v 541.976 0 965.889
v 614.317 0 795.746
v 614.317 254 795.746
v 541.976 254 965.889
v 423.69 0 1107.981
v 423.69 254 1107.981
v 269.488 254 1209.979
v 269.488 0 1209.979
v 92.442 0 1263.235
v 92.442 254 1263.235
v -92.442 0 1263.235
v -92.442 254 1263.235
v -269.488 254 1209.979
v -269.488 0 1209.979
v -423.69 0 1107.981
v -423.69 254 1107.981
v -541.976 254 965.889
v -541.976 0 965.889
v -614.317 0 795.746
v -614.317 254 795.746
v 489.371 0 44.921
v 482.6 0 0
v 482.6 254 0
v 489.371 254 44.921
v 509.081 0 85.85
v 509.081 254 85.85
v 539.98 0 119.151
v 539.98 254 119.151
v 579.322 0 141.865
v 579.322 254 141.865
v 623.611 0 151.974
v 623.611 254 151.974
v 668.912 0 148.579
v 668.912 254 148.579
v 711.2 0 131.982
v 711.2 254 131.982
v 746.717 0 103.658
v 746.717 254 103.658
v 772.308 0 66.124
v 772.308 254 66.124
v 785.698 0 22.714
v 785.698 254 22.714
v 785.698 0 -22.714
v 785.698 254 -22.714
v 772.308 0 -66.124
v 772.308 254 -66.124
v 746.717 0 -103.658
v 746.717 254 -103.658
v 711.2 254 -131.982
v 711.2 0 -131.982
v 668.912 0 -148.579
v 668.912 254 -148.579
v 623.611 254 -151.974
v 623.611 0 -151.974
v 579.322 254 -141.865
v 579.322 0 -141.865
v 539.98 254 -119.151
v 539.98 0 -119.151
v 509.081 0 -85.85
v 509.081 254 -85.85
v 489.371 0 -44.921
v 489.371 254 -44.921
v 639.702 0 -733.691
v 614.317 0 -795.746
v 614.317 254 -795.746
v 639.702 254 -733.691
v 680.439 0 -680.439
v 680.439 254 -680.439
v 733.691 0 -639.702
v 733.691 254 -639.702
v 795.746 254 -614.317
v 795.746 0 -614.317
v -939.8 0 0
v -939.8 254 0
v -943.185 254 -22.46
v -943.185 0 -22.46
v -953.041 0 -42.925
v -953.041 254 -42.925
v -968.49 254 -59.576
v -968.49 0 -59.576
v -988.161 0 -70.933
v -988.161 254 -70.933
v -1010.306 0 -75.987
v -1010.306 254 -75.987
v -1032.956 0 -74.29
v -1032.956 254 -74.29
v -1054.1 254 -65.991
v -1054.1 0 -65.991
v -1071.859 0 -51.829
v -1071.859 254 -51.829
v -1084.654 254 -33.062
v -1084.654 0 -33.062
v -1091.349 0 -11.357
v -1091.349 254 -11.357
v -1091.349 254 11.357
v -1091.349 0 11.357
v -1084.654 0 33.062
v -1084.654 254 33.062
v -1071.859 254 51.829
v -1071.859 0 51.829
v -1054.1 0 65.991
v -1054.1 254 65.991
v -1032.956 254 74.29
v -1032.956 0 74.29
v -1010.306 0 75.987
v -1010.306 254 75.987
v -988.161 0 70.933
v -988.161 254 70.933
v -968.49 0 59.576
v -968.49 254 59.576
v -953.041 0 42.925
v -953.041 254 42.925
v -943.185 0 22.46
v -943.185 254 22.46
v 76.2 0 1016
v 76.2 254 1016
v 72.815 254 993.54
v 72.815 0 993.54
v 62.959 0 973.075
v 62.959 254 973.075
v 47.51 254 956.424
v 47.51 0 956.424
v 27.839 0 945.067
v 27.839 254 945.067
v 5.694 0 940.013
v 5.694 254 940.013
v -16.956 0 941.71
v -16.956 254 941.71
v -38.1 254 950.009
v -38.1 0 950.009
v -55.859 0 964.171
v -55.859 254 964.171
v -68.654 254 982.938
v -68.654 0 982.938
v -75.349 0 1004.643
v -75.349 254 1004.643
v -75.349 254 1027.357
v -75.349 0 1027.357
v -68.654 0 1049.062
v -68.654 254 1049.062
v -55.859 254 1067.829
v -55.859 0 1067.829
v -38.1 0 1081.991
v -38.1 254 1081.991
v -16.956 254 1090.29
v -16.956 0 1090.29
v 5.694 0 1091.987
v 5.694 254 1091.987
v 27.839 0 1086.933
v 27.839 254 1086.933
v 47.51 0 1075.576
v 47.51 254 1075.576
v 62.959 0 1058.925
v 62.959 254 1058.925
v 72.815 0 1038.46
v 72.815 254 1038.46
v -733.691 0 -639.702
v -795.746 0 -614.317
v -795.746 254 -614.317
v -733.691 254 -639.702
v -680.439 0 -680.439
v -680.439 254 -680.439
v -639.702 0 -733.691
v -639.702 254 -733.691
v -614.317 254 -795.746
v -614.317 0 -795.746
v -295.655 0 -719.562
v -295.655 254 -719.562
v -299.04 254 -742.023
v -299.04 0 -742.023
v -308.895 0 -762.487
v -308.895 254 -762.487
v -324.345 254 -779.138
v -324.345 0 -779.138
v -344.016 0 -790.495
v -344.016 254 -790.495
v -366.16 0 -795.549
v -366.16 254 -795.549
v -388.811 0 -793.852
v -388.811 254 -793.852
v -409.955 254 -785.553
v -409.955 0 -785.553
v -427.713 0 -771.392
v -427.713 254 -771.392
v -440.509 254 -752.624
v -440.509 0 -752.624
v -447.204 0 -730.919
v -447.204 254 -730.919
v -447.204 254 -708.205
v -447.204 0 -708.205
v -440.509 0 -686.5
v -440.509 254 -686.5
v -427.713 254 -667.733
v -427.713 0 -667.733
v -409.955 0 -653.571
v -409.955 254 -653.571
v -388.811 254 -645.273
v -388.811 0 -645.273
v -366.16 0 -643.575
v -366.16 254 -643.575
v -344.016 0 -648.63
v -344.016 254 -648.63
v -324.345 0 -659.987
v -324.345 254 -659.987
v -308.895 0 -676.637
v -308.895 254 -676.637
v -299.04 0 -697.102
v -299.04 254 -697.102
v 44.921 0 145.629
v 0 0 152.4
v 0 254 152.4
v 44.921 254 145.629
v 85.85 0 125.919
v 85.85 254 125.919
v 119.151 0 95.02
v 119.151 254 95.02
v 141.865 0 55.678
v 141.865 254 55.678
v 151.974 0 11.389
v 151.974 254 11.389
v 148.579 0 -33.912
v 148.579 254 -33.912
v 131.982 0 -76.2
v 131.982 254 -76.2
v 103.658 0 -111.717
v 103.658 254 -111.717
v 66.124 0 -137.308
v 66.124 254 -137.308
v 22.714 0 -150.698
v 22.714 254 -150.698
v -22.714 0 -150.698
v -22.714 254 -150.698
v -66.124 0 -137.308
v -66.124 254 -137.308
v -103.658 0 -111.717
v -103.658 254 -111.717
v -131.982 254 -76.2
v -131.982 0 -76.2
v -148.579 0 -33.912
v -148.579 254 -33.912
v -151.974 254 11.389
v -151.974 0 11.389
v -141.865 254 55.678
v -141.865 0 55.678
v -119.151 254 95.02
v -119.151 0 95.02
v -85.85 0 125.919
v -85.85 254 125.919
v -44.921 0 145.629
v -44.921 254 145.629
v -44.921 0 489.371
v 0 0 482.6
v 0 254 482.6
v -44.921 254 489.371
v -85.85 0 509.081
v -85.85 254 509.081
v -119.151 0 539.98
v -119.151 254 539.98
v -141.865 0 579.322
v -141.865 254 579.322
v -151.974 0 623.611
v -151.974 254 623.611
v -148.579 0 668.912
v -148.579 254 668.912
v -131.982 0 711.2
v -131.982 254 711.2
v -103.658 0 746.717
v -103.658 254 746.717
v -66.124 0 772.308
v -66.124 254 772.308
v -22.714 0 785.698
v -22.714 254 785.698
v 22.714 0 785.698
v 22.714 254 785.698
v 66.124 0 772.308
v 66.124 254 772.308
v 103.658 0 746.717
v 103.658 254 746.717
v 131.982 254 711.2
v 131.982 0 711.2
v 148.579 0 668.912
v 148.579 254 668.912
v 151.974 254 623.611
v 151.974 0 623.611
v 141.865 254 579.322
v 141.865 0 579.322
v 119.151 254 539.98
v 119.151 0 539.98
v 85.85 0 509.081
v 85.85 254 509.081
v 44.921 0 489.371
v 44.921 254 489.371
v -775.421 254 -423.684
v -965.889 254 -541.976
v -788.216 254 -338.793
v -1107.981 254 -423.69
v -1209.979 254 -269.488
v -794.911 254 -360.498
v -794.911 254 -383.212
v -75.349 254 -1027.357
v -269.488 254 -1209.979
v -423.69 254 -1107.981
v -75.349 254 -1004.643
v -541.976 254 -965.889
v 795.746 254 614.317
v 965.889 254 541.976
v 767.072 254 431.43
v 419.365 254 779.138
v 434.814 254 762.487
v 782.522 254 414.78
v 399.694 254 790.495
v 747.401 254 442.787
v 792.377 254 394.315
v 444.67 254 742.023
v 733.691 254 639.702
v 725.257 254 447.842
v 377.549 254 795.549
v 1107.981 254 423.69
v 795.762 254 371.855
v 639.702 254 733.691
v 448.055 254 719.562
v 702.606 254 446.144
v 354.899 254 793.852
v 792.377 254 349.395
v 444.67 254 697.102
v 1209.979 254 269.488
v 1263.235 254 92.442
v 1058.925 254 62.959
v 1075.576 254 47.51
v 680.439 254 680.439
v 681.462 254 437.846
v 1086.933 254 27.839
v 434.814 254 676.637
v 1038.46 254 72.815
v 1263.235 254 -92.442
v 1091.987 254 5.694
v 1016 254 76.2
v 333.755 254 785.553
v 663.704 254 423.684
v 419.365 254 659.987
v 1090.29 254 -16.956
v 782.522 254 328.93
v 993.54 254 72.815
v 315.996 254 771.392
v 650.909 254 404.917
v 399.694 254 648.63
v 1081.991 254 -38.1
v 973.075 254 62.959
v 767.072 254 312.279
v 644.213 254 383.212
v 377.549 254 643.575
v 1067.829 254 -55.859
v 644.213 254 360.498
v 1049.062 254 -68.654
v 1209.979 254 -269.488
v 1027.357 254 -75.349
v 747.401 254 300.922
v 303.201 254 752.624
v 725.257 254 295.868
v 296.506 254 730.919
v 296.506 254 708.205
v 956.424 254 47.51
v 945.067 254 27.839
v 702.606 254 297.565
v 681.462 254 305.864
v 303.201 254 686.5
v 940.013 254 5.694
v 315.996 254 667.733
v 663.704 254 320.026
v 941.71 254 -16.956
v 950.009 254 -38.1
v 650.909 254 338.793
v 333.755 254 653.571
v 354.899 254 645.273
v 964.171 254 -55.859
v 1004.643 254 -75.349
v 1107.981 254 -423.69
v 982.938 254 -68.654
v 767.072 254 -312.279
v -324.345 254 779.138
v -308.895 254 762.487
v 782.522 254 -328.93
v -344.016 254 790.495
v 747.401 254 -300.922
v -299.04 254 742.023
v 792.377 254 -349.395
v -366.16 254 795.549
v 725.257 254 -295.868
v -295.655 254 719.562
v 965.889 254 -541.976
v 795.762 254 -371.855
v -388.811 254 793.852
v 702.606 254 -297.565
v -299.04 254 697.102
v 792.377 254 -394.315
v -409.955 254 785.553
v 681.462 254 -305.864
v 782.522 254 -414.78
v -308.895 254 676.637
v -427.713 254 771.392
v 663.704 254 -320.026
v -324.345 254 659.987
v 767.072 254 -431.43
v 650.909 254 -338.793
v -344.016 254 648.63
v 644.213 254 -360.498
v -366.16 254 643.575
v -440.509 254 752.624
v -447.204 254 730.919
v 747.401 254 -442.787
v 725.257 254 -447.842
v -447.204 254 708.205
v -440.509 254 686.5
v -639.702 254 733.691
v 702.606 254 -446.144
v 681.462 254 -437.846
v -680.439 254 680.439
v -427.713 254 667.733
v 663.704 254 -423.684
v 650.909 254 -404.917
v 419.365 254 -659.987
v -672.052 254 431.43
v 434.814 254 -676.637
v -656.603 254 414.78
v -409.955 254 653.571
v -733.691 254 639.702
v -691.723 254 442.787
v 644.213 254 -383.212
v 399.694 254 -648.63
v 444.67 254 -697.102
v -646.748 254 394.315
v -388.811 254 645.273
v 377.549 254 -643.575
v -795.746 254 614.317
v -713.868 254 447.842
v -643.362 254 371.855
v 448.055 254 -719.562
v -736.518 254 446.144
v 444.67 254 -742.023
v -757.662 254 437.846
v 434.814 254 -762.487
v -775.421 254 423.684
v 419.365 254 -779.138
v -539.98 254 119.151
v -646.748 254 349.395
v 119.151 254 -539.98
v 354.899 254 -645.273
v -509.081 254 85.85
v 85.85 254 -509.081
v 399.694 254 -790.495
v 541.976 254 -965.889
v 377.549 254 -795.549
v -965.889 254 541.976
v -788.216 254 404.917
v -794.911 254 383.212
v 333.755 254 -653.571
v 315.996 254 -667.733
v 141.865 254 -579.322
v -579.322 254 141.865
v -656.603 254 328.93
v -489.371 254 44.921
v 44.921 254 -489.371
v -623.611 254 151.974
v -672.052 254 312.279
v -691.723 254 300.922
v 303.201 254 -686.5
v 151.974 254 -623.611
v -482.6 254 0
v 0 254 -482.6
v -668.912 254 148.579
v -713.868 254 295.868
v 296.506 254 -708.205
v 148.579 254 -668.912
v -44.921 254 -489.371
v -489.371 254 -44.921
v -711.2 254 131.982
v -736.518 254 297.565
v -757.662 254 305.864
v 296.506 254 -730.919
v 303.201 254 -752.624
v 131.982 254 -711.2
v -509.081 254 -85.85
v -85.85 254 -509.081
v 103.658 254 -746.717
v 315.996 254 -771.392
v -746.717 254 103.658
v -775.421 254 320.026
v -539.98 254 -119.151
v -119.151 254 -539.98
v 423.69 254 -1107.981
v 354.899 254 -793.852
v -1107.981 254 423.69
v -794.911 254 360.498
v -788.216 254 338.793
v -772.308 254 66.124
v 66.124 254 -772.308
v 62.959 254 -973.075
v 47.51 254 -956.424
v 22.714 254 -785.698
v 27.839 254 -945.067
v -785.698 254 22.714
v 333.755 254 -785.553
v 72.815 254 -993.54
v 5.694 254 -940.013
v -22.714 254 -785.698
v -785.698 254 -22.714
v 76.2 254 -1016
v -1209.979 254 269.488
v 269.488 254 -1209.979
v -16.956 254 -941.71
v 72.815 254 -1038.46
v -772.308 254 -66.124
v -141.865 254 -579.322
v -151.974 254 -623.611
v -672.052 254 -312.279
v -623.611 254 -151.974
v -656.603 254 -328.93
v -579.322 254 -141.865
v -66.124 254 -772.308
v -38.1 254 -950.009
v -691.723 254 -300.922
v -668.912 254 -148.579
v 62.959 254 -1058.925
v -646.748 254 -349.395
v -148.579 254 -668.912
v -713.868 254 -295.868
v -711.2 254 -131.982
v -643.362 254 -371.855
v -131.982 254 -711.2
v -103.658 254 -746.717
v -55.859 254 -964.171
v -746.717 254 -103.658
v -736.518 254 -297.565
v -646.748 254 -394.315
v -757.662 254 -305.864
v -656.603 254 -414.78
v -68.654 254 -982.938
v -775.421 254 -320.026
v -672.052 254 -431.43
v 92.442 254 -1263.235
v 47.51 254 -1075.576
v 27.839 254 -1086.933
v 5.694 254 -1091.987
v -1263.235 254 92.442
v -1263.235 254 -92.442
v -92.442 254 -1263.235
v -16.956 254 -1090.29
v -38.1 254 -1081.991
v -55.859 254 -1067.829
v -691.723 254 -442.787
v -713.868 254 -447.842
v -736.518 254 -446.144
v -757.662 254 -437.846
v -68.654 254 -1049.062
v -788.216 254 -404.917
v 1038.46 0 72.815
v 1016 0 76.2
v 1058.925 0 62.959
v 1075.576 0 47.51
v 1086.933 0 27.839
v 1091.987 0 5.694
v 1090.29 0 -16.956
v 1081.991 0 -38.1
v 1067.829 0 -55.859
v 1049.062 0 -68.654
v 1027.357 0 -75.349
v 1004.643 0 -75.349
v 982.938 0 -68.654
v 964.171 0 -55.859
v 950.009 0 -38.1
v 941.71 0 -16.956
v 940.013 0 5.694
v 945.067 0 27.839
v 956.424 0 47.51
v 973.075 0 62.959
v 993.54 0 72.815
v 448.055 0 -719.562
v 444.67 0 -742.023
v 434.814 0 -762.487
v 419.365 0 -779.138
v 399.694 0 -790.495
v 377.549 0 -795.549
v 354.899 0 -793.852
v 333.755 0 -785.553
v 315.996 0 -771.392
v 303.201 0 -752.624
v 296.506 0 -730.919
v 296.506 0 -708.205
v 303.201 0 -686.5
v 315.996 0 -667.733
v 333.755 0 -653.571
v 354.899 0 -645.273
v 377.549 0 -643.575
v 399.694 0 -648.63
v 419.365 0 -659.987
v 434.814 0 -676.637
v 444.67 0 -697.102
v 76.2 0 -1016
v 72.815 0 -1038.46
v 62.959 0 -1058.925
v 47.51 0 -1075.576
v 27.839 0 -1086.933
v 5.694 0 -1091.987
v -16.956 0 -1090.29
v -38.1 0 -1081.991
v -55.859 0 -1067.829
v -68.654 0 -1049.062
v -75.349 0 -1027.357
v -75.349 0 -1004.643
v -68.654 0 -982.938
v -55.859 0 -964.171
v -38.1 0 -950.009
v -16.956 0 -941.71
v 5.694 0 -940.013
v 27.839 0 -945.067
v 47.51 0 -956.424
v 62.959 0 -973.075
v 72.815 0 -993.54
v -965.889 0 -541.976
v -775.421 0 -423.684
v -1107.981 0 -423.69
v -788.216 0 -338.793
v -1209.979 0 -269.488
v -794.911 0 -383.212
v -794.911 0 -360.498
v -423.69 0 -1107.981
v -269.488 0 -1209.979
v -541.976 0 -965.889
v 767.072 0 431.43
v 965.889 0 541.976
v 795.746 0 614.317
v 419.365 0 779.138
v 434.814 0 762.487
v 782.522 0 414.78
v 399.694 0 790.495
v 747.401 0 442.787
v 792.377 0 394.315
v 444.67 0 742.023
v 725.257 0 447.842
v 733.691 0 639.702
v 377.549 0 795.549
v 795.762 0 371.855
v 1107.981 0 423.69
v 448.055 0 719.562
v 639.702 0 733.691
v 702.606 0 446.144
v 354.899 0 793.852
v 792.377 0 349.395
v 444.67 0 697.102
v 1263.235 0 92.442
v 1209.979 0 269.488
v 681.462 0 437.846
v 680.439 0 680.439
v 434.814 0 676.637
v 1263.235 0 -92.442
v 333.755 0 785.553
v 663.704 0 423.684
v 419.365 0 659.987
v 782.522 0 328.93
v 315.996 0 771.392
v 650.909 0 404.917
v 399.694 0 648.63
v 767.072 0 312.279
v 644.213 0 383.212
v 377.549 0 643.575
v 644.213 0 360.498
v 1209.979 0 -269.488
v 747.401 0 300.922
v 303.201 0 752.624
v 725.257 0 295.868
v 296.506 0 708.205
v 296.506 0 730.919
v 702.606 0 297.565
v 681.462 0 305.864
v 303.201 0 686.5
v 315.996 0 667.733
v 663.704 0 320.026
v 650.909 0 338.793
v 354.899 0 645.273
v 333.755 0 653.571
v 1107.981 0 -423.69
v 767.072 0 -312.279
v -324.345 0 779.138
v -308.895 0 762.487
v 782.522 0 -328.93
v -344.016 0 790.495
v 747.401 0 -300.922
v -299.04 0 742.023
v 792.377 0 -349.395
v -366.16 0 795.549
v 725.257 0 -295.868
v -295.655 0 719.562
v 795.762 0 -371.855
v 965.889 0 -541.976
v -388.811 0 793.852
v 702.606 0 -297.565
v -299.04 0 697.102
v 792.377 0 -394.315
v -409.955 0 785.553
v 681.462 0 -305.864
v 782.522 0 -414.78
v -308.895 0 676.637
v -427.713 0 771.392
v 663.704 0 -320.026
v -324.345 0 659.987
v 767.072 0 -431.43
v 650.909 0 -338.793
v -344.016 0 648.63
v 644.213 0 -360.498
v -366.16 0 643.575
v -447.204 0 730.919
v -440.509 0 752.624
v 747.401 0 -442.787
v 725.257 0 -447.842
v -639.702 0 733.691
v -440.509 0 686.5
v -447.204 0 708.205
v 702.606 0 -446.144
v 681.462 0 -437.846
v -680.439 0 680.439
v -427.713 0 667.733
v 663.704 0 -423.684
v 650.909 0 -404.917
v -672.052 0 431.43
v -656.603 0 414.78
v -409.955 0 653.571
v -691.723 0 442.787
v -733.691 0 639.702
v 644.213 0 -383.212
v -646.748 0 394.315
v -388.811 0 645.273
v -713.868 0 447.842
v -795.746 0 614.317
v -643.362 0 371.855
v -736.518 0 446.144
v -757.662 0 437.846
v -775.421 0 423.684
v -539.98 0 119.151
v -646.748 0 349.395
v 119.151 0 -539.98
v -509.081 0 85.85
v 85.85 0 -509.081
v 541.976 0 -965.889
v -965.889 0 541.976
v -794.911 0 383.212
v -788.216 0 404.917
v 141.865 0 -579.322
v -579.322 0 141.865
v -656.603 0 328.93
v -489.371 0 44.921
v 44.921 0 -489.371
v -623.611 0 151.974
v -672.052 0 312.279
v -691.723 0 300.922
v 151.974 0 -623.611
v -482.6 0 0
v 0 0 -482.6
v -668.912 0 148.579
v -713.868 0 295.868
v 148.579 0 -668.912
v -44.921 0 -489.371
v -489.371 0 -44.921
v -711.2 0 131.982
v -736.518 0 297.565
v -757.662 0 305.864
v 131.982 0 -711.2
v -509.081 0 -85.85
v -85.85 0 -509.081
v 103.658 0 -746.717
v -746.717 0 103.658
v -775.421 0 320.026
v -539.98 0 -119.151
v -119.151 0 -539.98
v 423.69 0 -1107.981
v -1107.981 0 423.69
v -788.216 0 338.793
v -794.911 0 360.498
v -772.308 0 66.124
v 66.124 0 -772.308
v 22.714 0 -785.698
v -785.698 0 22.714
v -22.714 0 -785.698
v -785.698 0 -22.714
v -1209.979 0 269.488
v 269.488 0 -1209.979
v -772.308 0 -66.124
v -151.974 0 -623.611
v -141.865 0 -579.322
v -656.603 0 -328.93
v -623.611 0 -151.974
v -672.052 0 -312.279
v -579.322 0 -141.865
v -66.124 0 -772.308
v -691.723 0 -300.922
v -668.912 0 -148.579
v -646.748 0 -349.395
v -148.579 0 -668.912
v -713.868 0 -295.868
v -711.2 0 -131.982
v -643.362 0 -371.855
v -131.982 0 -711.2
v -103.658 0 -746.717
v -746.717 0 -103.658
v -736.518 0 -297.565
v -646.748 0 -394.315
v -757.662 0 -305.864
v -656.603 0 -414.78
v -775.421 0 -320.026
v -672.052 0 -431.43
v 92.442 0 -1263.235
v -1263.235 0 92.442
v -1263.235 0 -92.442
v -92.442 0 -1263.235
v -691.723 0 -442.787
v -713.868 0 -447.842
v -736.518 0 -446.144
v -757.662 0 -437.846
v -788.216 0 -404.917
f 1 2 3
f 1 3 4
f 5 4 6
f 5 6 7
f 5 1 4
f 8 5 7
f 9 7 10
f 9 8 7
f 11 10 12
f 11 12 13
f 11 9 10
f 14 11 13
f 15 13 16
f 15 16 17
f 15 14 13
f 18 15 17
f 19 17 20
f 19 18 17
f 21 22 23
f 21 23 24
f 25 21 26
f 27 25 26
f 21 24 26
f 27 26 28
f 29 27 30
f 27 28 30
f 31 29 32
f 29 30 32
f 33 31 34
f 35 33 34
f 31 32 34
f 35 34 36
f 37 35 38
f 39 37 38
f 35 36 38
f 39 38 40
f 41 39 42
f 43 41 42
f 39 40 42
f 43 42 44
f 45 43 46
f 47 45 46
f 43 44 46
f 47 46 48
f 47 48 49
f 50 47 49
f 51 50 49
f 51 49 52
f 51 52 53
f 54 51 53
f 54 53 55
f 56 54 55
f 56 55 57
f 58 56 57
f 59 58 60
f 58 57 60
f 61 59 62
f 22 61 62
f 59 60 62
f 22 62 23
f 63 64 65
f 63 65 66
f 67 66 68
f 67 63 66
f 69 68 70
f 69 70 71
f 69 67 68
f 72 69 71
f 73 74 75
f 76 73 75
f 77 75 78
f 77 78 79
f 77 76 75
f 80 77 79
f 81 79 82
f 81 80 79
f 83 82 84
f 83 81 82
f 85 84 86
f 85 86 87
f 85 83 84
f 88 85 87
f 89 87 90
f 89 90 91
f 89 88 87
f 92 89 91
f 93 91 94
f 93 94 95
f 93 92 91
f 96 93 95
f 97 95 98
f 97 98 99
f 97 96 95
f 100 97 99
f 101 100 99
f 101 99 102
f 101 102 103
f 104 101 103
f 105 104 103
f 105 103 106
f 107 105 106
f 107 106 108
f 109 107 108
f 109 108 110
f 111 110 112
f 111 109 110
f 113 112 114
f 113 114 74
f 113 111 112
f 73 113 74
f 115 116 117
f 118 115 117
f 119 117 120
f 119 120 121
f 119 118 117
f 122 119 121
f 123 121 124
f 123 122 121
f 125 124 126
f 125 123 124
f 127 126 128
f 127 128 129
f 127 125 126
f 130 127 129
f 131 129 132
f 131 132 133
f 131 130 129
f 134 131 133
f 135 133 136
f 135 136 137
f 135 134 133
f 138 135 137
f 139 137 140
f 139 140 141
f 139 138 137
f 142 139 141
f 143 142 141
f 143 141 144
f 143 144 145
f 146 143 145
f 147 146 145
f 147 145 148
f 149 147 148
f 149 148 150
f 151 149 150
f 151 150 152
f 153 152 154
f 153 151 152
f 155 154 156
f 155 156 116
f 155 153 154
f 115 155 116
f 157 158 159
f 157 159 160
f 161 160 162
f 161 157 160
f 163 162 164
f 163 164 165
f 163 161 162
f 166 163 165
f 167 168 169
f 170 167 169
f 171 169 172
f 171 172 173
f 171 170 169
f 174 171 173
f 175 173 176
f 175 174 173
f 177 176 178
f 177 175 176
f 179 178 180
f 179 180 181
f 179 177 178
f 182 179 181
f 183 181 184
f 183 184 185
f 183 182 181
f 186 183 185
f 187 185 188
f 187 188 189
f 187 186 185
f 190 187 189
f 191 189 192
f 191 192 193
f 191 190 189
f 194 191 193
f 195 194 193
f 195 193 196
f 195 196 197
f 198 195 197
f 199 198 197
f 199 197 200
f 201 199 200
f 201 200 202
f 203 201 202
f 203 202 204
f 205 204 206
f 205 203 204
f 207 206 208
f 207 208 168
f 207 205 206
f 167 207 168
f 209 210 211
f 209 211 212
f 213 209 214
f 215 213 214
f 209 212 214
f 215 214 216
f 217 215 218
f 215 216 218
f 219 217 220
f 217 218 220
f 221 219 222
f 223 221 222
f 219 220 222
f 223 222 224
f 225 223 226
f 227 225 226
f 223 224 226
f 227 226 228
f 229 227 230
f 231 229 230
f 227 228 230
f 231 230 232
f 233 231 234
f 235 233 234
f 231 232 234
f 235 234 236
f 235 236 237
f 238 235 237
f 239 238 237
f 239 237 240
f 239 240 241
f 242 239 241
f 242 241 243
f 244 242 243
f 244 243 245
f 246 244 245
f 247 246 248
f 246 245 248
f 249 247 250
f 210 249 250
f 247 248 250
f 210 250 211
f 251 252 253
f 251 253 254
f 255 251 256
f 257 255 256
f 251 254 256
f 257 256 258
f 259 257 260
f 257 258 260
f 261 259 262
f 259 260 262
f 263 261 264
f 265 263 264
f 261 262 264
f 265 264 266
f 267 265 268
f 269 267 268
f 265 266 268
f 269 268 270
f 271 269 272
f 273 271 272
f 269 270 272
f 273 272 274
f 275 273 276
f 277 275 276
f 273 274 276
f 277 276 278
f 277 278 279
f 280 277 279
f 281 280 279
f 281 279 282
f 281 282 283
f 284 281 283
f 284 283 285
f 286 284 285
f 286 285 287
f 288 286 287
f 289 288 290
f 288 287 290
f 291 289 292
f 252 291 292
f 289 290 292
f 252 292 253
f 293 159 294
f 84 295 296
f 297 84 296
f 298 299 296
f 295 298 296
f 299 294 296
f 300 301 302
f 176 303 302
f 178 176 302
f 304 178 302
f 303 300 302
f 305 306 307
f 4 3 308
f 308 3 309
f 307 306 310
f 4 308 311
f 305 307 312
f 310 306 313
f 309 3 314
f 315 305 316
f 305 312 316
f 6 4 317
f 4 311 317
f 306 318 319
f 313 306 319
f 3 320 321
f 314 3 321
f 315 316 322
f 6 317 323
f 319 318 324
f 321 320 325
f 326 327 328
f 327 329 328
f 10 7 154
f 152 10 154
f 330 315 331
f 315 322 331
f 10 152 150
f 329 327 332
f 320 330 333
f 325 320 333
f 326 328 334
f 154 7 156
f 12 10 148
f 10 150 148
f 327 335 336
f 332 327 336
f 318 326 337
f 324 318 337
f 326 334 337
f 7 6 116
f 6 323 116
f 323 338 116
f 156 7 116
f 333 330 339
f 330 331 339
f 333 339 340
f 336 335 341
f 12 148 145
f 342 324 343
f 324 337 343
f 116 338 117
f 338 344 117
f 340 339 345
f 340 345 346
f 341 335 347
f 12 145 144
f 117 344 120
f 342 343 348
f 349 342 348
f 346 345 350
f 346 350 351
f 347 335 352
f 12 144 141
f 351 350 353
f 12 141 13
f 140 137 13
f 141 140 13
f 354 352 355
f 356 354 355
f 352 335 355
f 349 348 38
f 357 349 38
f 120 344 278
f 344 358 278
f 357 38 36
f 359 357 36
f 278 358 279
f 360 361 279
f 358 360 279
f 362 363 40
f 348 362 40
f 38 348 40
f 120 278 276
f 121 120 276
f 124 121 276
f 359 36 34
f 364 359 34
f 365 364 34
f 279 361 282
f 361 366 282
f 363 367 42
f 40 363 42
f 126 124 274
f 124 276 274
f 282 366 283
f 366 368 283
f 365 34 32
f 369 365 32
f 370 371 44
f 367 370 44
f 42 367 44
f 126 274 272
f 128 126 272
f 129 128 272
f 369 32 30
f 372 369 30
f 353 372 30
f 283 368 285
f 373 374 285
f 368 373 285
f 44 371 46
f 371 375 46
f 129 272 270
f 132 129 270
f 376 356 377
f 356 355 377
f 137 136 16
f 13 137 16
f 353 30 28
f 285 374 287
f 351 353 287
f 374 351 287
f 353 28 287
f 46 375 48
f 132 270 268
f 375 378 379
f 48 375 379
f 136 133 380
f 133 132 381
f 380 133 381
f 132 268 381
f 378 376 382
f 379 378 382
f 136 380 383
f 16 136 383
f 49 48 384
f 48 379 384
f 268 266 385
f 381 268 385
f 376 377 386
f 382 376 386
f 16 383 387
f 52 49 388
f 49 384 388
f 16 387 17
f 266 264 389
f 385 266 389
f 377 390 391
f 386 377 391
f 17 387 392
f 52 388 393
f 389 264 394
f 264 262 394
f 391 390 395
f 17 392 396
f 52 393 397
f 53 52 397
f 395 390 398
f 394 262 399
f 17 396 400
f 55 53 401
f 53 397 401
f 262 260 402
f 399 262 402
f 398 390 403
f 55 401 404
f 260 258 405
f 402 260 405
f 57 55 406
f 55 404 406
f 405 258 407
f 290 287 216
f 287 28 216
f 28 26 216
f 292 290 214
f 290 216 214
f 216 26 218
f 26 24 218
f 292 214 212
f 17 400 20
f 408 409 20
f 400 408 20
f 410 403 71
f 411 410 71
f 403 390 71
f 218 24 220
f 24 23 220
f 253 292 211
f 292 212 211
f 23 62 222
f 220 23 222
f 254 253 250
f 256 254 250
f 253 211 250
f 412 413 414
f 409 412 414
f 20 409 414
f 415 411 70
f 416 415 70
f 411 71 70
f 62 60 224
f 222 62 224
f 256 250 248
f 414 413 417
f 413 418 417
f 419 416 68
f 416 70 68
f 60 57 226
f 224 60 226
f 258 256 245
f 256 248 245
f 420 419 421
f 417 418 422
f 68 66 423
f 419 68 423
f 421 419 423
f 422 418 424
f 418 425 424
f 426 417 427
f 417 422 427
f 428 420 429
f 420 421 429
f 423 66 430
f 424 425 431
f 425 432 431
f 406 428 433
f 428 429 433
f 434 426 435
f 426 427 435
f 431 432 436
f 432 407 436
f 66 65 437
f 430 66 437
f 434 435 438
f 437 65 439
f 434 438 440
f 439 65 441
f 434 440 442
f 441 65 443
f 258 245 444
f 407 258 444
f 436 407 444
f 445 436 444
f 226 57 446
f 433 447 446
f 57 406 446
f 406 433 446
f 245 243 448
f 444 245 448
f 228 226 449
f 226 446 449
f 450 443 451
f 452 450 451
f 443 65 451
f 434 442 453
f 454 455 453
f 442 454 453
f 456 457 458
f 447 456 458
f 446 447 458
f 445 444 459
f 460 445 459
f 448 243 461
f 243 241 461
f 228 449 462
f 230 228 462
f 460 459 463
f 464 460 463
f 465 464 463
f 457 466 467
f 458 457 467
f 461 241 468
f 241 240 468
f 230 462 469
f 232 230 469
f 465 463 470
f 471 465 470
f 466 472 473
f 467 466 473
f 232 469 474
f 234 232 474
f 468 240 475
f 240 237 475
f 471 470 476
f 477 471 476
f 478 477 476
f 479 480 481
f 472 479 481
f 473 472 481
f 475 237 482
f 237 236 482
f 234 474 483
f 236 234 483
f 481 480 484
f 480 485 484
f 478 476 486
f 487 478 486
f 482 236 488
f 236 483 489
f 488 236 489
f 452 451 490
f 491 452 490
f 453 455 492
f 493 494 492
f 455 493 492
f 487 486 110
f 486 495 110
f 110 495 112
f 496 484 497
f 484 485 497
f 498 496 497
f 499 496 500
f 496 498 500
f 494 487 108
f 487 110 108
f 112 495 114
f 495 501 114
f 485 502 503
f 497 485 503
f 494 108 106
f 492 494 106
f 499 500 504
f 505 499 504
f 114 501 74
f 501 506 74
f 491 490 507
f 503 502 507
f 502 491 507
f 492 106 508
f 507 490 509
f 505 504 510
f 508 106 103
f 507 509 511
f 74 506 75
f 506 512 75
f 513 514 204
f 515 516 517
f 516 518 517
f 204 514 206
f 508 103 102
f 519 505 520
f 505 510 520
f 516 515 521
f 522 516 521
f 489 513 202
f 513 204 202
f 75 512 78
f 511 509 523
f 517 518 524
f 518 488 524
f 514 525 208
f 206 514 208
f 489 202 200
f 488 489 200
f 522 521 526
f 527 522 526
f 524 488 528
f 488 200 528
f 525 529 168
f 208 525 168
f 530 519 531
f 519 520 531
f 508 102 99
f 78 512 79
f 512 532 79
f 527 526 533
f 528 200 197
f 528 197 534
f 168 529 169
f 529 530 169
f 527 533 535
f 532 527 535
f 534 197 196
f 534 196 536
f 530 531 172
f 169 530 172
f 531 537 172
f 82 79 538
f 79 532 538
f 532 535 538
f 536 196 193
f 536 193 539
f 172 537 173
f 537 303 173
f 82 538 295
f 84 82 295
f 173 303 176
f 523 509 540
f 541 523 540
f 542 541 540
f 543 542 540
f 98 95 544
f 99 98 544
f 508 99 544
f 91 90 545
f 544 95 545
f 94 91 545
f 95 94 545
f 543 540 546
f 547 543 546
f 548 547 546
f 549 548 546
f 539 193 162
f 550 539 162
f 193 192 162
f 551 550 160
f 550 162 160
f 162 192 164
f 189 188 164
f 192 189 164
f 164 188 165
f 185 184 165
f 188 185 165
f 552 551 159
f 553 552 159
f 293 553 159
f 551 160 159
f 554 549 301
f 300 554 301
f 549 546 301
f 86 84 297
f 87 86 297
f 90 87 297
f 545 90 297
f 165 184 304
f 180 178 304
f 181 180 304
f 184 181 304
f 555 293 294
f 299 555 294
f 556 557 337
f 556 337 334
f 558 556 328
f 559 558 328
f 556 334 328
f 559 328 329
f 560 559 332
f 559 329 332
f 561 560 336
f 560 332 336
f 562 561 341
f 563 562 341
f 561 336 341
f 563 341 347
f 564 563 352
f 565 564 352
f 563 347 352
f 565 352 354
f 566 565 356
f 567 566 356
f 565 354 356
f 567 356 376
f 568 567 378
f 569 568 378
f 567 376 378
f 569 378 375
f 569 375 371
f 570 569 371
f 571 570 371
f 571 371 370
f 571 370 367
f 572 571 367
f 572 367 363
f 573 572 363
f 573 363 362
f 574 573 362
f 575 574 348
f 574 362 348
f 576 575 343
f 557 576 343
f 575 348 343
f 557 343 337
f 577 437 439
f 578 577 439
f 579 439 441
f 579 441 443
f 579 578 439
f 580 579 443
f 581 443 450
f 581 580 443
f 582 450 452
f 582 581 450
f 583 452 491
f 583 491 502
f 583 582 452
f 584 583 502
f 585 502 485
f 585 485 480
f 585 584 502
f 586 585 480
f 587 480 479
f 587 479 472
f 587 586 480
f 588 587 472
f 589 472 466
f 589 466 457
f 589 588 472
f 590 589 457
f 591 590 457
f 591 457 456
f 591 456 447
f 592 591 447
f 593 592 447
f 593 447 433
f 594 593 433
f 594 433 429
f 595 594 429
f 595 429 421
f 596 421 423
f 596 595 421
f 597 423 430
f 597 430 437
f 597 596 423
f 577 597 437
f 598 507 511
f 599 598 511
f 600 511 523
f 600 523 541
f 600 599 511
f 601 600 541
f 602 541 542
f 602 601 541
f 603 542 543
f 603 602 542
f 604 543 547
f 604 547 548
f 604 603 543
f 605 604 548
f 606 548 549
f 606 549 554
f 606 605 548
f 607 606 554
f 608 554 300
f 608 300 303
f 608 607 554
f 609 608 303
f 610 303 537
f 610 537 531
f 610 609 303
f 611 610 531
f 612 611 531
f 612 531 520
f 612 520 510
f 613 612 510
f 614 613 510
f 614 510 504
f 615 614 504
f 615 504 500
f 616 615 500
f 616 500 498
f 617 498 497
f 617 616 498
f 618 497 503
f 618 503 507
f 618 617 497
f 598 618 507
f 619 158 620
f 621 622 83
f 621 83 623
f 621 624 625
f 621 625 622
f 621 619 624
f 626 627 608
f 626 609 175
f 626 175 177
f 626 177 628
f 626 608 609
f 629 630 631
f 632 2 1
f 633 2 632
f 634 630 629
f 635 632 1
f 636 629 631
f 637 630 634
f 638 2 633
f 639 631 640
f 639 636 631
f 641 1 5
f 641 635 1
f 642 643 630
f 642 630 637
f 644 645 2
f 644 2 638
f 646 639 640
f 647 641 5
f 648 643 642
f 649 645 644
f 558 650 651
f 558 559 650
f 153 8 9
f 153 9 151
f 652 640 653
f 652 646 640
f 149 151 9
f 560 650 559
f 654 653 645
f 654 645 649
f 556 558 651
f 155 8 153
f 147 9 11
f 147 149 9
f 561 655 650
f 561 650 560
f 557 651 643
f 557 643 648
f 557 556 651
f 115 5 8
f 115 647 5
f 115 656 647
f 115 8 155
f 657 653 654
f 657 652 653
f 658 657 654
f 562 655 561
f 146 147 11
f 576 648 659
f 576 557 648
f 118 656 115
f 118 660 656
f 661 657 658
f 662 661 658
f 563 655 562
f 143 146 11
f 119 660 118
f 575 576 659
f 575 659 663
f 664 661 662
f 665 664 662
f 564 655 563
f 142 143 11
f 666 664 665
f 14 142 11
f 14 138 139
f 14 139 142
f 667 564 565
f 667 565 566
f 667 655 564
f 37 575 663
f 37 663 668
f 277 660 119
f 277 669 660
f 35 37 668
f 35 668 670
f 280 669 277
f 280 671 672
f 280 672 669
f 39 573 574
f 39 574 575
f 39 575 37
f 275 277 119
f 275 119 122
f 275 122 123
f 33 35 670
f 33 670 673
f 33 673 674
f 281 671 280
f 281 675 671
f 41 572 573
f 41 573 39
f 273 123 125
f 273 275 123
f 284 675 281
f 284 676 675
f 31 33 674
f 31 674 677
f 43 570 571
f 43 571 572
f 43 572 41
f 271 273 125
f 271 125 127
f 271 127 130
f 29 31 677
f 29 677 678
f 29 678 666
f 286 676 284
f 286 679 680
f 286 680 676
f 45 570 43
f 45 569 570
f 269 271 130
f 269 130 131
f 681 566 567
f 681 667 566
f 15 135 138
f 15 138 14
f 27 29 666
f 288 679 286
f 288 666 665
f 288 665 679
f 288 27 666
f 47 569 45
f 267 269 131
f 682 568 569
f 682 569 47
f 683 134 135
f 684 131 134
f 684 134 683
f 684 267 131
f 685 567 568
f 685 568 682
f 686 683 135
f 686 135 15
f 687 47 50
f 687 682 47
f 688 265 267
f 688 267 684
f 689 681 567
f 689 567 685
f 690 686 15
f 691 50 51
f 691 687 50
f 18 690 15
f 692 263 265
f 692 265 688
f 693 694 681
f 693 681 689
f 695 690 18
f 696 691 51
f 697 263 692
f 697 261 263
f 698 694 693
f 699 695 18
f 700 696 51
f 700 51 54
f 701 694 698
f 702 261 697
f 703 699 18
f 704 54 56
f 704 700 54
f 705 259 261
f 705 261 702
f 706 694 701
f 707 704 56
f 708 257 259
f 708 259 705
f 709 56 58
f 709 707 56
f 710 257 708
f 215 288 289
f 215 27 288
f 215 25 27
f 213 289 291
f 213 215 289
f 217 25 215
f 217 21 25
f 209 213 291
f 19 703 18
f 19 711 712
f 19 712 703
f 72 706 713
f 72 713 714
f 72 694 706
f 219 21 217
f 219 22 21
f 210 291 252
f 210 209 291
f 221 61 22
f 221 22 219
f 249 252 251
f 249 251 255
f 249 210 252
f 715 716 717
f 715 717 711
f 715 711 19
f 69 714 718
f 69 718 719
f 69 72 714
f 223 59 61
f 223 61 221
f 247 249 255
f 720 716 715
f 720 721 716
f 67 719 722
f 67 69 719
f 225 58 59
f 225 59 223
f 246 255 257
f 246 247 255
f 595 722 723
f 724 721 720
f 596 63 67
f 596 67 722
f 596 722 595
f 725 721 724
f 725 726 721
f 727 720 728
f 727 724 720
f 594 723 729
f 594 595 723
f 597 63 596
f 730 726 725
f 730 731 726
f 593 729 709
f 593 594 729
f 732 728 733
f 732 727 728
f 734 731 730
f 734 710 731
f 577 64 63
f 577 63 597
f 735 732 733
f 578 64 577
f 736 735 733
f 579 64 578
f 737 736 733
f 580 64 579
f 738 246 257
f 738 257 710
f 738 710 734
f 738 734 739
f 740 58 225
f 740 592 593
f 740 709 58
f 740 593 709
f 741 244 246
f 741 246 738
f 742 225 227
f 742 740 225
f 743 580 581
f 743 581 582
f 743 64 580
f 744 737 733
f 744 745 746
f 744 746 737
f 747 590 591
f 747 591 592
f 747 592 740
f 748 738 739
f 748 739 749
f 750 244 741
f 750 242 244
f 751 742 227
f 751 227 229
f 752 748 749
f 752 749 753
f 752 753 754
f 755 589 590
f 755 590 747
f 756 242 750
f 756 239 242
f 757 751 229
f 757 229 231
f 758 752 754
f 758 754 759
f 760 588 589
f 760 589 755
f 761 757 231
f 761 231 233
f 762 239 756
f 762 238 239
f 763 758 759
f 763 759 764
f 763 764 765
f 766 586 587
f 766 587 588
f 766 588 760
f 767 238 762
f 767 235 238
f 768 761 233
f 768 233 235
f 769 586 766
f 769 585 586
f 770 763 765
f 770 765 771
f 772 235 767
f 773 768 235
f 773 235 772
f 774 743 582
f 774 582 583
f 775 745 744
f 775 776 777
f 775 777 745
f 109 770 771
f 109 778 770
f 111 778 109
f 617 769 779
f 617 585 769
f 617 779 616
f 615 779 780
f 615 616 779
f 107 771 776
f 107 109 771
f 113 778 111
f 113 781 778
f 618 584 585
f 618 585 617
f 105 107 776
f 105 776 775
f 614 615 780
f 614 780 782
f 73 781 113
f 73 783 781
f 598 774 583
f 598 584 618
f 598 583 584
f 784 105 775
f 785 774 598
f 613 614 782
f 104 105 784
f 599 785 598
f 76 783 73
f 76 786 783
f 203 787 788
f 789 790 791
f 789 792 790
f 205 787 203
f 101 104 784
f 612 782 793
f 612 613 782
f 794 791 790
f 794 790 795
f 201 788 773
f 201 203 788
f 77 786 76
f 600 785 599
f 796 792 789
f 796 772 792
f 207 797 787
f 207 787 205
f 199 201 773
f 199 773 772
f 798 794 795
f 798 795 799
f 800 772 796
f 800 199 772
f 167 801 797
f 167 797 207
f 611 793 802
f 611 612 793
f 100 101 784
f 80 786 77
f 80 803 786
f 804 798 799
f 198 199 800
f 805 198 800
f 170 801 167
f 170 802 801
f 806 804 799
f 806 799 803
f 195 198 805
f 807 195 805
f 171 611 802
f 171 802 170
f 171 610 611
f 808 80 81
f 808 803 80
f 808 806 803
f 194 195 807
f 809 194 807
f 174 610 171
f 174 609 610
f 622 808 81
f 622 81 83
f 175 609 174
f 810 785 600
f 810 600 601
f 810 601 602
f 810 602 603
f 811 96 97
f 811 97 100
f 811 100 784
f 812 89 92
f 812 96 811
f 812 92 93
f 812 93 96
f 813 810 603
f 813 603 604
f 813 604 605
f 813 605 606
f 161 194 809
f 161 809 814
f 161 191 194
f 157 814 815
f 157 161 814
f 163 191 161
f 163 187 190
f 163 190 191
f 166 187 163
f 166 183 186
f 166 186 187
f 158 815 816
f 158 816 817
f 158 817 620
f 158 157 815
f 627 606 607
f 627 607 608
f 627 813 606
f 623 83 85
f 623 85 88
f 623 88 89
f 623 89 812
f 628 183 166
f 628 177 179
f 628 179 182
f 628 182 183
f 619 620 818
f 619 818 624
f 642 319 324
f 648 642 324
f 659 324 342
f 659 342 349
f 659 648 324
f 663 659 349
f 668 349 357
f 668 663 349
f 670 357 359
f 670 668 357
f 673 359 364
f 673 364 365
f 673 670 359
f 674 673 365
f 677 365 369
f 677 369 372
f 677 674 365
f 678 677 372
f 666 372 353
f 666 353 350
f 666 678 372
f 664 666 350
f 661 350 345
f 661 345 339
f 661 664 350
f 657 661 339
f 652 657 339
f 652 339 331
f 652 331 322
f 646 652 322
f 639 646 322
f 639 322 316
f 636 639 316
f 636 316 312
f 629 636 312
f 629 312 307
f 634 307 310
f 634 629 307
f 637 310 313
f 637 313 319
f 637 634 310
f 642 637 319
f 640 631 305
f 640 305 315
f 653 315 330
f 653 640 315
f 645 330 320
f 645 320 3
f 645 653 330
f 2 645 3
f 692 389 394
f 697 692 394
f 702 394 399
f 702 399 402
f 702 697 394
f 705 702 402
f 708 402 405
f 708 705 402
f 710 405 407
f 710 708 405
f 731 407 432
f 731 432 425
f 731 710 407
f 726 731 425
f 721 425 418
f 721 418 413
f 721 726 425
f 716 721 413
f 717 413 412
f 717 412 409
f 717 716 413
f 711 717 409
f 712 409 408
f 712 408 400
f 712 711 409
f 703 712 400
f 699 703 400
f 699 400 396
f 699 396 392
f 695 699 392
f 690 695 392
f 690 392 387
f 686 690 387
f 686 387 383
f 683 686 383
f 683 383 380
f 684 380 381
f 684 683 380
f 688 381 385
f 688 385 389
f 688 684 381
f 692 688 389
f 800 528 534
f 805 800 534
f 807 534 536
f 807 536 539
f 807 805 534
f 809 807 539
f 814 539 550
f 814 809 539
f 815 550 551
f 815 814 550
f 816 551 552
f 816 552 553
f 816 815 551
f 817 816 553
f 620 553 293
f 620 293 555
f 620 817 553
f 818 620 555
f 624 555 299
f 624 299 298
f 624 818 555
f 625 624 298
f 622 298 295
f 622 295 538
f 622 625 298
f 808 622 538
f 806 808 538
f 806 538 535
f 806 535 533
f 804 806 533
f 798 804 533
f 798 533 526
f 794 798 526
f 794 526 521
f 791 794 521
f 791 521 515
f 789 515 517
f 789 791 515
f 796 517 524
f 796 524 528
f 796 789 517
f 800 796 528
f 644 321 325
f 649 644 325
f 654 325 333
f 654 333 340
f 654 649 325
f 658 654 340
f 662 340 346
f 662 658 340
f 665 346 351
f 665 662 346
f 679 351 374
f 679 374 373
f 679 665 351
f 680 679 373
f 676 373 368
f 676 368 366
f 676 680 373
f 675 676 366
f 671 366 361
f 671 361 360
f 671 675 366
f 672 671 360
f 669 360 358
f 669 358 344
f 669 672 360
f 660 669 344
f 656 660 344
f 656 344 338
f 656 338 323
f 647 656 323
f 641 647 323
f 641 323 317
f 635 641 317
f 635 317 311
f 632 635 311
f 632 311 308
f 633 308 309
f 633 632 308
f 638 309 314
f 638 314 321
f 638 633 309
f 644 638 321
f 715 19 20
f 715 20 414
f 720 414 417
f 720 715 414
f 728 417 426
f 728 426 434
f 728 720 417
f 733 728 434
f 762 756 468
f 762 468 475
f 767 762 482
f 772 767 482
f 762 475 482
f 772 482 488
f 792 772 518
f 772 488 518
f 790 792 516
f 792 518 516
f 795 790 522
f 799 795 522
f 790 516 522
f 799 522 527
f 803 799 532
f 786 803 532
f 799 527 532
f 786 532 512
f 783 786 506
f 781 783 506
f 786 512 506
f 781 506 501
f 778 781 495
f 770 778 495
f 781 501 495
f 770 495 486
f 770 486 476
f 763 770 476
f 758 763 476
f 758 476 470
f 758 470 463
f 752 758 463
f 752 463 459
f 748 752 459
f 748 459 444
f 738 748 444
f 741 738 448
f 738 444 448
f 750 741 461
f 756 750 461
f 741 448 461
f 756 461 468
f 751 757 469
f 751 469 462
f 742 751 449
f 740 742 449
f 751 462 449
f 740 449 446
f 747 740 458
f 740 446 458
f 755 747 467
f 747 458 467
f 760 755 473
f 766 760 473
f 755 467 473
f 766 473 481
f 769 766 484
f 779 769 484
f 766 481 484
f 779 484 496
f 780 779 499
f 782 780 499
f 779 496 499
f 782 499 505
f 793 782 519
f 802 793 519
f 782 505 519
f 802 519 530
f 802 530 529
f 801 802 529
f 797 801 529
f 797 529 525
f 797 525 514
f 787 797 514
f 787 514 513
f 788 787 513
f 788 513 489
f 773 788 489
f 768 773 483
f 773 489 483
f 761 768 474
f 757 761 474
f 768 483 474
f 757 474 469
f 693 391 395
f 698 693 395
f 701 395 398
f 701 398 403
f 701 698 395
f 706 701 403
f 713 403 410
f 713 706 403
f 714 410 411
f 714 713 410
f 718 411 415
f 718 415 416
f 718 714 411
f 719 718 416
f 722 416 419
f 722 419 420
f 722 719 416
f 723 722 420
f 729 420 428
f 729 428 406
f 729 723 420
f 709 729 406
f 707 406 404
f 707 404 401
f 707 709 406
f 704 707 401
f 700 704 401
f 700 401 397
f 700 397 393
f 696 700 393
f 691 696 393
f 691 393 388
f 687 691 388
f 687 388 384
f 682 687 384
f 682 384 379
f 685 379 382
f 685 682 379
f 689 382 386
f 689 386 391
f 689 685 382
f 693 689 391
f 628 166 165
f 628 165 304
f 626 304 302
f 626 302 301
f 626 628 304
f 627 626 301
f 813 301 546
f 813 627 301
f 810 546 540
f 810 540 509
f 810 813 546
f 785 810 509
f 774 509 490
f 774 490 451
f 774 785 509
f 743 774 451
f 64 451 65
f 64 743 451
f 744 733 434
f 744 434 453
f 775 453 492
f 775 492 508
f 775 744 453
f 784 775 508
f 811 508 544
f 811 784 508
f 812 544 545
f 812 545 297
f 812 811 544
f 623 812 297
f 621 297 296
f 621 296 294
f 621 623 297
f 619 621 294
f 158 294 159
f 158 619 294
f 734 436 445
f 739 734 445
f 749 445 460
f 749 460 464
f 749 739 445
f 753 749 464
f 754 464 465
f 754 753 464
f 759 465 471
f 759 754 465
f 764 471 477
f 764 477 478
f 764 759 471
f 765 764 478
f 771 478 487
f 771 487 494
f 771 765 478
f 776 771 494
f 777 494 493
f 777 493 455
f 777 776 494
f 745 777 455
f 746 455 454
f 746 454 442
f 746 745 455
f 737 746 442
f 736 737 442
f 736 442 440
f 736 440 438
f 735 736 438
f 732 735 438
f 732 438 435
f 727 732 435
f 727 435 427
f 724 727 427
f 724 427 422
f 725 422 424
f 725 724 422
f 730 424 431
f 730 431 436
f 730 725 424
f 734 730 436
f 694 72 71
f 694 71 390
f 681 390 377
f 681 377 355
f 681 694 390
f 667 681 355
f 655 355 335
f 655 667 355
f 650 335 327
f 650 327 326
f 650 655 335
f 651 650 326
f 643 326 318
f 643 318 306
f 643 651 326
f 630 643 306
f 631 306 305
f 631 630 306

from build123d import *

# Parameters (mm, degrees)
BOSS_EXTRUDE1_DEPTH   = 254
SKETCH7_R             = 76.2
CUT_EXTRUDE2_DEPTH    = 254
CRVPATTERN1_OUTLINE_R = 76.2
CRVPATTERN1_DEPTH     = 254
SKETCH9_R             = 152.4
CUT_EXTRUDE3_DEPTH    = 254
CRVPATTERN2_COUNT     = 4
SKETCH10_R            = 152.4
CUT_EXTRUDE4_DEPTH    = 254


# Read off the part's stored shape, not the designer's step: CrvPattern1
with BuildPart() as part:
    # Sketch1 → Boss-Extrude1 (new body)
    with BuildSketch(Plane(origin=(0, 0, 0), x_dir=(1, 0, 0), z_dir=(0, 1, 0))):
        with BuildLine():
            ThreePointArc((-614.317312734, 795.745884163), (0, 1270), (614.317312734, 795.745884163))
            ThreePointArc((614.317312734, 795.745884163), (680.439115406, 680.439115406), (795.745884163, 614.317312734))
            ThreePointArc((795.745884163, 614.317312734), (1270, 0), (795.745884163, -614.317312734))
            ThreePointArc((795.745884163, -614.317312734), (680.439115406, -680.439115406), (614.317312734, -795.745884163))
            ThreePointArc((614.317312734, -795.745884163), (0, -1270), (-614.317312734, -795.745884163))
            ThreePointArc((-614.317312734, -795.745884163), (-680.439115406, -680.439115406), (-795.745884163, -614.317312734))
            ThreePointArc((-795.745884163, -614.317312734), (-1270, 0), (-795.745884163, 614.317312734))
            ThreePointArc((-795.745884163, 614.317312734), (-680.439115406, 680.439115406), (-614.317312734, 795.745884163))
        make_face()
    extrude(amount=BOSS_EXTRUDE1_DEPTH)

    # Sketch7 → Cut-Extrude2 (cut)
    with BuildSketch(Plane(origin=(0, 254, 0), x_dir=(1, 0, 0), z_dir=(0, 1, 0))):
        with Locations(Location((1016, 0, 0), (0, 0, 270))):
            Circle(SKETCH7_R)
    extrude(amount=-CUT_EXTRUDE2_DEPTH, mode=Mode.SUBTRACT)

    # CrvPattern1 outline → CrvPattern1 (cut)
    with BuildSketch(Plane(origin=(0, 0, 0), x_dir=(1, 0, 0), z_dir=(0, 1, 0))):
        with Locations((719.562357426, 371.854888007)):
            Circle(CRVPATTERN1_OUTLINE_R)
        with Locations((719.562357426, -371.854888007)):
            Circle(CRVPATTERN1_OUTLINE_R)
        with Locations((371.854888007, -719.562357426)):
            Circle(CRVPATTERN1_OUTLINE_R)
        with Locations((0, -1016)):
            Circle(CRVPATTERN1_OUTLINE_R)
        with Locations((-371.854888007, -719.562357426)):
            Circle(CRVPATTERN1_OUTLINE_R)
        with Locations((-719.562357426, -371.854888007)):
            Circle(CRVPATTERN1_OUTLINE_R)
        with Locations((-1016, 0)):
            Circle(CRVPATTERN1_OUTLINE_R)
        with Locations((-719.562357426, 371.854888007)):
            Circle(CRVPATTERN1_OUTLINE_R)
        with Locations((-371.854888007, 719.562357426)):
            Circle(CRVPATTERN1_OUTLINE_R)
        with Locations((0, 1016)):
            Circle(CRVPATTERN1_OUTLINE_R)
        with Locations((371.854888007, 719.562357426)):
            Circle(CRVPATTERN1_OUTLINE_R)
    extrude(amount=CRVPATTERN1_DEPTH, mode=Mode.SUBTRACT)

    # Sketch9 → Cut-Extrude3 (cut)
    with BuildSketch(Plane(origin=(0, 254, 0), x_dir=(1, 0, 0), z_dir=(0, 1, 0))):
        with Locations(Location((0, 635, 0), (0, 0, 270))):
            Circle(SKETCH9_R)
    cut_extrude3 = extrude(amount=-CUT_EXTRUDE3_DEPTH, mode=Mode.SUBTRACT)

    # CrvPattern2: Cut-Extrude3 ×4 about axis
    crvpattern2_axis = Axis((0, 254, 0), (0, 1, 0))
    for i in range(1, CRVPATTERN2_COUNT):
        add(cut_extrude3.rotate(crvpattern2_axis, i * 360 / CRVPATTERN2_COUNT), mode=Mode.SUBTRACT)

    # Sketch10 → Cut-Extrude4 (cut)
    with BuildSketch(Plane(origin=(0, 254, 0), x_dir=(1, 0, 0), z_dir=(0, 1, 0))):
        with Locations(Location((0, 0, 0), (0, 0, 270))):
            Circle(SKETCH10_R)
    extrude(amount=-CUT_EXTRUDE4_DEPTH, mode=Mode.SUBTRACT)


solid = part.part
